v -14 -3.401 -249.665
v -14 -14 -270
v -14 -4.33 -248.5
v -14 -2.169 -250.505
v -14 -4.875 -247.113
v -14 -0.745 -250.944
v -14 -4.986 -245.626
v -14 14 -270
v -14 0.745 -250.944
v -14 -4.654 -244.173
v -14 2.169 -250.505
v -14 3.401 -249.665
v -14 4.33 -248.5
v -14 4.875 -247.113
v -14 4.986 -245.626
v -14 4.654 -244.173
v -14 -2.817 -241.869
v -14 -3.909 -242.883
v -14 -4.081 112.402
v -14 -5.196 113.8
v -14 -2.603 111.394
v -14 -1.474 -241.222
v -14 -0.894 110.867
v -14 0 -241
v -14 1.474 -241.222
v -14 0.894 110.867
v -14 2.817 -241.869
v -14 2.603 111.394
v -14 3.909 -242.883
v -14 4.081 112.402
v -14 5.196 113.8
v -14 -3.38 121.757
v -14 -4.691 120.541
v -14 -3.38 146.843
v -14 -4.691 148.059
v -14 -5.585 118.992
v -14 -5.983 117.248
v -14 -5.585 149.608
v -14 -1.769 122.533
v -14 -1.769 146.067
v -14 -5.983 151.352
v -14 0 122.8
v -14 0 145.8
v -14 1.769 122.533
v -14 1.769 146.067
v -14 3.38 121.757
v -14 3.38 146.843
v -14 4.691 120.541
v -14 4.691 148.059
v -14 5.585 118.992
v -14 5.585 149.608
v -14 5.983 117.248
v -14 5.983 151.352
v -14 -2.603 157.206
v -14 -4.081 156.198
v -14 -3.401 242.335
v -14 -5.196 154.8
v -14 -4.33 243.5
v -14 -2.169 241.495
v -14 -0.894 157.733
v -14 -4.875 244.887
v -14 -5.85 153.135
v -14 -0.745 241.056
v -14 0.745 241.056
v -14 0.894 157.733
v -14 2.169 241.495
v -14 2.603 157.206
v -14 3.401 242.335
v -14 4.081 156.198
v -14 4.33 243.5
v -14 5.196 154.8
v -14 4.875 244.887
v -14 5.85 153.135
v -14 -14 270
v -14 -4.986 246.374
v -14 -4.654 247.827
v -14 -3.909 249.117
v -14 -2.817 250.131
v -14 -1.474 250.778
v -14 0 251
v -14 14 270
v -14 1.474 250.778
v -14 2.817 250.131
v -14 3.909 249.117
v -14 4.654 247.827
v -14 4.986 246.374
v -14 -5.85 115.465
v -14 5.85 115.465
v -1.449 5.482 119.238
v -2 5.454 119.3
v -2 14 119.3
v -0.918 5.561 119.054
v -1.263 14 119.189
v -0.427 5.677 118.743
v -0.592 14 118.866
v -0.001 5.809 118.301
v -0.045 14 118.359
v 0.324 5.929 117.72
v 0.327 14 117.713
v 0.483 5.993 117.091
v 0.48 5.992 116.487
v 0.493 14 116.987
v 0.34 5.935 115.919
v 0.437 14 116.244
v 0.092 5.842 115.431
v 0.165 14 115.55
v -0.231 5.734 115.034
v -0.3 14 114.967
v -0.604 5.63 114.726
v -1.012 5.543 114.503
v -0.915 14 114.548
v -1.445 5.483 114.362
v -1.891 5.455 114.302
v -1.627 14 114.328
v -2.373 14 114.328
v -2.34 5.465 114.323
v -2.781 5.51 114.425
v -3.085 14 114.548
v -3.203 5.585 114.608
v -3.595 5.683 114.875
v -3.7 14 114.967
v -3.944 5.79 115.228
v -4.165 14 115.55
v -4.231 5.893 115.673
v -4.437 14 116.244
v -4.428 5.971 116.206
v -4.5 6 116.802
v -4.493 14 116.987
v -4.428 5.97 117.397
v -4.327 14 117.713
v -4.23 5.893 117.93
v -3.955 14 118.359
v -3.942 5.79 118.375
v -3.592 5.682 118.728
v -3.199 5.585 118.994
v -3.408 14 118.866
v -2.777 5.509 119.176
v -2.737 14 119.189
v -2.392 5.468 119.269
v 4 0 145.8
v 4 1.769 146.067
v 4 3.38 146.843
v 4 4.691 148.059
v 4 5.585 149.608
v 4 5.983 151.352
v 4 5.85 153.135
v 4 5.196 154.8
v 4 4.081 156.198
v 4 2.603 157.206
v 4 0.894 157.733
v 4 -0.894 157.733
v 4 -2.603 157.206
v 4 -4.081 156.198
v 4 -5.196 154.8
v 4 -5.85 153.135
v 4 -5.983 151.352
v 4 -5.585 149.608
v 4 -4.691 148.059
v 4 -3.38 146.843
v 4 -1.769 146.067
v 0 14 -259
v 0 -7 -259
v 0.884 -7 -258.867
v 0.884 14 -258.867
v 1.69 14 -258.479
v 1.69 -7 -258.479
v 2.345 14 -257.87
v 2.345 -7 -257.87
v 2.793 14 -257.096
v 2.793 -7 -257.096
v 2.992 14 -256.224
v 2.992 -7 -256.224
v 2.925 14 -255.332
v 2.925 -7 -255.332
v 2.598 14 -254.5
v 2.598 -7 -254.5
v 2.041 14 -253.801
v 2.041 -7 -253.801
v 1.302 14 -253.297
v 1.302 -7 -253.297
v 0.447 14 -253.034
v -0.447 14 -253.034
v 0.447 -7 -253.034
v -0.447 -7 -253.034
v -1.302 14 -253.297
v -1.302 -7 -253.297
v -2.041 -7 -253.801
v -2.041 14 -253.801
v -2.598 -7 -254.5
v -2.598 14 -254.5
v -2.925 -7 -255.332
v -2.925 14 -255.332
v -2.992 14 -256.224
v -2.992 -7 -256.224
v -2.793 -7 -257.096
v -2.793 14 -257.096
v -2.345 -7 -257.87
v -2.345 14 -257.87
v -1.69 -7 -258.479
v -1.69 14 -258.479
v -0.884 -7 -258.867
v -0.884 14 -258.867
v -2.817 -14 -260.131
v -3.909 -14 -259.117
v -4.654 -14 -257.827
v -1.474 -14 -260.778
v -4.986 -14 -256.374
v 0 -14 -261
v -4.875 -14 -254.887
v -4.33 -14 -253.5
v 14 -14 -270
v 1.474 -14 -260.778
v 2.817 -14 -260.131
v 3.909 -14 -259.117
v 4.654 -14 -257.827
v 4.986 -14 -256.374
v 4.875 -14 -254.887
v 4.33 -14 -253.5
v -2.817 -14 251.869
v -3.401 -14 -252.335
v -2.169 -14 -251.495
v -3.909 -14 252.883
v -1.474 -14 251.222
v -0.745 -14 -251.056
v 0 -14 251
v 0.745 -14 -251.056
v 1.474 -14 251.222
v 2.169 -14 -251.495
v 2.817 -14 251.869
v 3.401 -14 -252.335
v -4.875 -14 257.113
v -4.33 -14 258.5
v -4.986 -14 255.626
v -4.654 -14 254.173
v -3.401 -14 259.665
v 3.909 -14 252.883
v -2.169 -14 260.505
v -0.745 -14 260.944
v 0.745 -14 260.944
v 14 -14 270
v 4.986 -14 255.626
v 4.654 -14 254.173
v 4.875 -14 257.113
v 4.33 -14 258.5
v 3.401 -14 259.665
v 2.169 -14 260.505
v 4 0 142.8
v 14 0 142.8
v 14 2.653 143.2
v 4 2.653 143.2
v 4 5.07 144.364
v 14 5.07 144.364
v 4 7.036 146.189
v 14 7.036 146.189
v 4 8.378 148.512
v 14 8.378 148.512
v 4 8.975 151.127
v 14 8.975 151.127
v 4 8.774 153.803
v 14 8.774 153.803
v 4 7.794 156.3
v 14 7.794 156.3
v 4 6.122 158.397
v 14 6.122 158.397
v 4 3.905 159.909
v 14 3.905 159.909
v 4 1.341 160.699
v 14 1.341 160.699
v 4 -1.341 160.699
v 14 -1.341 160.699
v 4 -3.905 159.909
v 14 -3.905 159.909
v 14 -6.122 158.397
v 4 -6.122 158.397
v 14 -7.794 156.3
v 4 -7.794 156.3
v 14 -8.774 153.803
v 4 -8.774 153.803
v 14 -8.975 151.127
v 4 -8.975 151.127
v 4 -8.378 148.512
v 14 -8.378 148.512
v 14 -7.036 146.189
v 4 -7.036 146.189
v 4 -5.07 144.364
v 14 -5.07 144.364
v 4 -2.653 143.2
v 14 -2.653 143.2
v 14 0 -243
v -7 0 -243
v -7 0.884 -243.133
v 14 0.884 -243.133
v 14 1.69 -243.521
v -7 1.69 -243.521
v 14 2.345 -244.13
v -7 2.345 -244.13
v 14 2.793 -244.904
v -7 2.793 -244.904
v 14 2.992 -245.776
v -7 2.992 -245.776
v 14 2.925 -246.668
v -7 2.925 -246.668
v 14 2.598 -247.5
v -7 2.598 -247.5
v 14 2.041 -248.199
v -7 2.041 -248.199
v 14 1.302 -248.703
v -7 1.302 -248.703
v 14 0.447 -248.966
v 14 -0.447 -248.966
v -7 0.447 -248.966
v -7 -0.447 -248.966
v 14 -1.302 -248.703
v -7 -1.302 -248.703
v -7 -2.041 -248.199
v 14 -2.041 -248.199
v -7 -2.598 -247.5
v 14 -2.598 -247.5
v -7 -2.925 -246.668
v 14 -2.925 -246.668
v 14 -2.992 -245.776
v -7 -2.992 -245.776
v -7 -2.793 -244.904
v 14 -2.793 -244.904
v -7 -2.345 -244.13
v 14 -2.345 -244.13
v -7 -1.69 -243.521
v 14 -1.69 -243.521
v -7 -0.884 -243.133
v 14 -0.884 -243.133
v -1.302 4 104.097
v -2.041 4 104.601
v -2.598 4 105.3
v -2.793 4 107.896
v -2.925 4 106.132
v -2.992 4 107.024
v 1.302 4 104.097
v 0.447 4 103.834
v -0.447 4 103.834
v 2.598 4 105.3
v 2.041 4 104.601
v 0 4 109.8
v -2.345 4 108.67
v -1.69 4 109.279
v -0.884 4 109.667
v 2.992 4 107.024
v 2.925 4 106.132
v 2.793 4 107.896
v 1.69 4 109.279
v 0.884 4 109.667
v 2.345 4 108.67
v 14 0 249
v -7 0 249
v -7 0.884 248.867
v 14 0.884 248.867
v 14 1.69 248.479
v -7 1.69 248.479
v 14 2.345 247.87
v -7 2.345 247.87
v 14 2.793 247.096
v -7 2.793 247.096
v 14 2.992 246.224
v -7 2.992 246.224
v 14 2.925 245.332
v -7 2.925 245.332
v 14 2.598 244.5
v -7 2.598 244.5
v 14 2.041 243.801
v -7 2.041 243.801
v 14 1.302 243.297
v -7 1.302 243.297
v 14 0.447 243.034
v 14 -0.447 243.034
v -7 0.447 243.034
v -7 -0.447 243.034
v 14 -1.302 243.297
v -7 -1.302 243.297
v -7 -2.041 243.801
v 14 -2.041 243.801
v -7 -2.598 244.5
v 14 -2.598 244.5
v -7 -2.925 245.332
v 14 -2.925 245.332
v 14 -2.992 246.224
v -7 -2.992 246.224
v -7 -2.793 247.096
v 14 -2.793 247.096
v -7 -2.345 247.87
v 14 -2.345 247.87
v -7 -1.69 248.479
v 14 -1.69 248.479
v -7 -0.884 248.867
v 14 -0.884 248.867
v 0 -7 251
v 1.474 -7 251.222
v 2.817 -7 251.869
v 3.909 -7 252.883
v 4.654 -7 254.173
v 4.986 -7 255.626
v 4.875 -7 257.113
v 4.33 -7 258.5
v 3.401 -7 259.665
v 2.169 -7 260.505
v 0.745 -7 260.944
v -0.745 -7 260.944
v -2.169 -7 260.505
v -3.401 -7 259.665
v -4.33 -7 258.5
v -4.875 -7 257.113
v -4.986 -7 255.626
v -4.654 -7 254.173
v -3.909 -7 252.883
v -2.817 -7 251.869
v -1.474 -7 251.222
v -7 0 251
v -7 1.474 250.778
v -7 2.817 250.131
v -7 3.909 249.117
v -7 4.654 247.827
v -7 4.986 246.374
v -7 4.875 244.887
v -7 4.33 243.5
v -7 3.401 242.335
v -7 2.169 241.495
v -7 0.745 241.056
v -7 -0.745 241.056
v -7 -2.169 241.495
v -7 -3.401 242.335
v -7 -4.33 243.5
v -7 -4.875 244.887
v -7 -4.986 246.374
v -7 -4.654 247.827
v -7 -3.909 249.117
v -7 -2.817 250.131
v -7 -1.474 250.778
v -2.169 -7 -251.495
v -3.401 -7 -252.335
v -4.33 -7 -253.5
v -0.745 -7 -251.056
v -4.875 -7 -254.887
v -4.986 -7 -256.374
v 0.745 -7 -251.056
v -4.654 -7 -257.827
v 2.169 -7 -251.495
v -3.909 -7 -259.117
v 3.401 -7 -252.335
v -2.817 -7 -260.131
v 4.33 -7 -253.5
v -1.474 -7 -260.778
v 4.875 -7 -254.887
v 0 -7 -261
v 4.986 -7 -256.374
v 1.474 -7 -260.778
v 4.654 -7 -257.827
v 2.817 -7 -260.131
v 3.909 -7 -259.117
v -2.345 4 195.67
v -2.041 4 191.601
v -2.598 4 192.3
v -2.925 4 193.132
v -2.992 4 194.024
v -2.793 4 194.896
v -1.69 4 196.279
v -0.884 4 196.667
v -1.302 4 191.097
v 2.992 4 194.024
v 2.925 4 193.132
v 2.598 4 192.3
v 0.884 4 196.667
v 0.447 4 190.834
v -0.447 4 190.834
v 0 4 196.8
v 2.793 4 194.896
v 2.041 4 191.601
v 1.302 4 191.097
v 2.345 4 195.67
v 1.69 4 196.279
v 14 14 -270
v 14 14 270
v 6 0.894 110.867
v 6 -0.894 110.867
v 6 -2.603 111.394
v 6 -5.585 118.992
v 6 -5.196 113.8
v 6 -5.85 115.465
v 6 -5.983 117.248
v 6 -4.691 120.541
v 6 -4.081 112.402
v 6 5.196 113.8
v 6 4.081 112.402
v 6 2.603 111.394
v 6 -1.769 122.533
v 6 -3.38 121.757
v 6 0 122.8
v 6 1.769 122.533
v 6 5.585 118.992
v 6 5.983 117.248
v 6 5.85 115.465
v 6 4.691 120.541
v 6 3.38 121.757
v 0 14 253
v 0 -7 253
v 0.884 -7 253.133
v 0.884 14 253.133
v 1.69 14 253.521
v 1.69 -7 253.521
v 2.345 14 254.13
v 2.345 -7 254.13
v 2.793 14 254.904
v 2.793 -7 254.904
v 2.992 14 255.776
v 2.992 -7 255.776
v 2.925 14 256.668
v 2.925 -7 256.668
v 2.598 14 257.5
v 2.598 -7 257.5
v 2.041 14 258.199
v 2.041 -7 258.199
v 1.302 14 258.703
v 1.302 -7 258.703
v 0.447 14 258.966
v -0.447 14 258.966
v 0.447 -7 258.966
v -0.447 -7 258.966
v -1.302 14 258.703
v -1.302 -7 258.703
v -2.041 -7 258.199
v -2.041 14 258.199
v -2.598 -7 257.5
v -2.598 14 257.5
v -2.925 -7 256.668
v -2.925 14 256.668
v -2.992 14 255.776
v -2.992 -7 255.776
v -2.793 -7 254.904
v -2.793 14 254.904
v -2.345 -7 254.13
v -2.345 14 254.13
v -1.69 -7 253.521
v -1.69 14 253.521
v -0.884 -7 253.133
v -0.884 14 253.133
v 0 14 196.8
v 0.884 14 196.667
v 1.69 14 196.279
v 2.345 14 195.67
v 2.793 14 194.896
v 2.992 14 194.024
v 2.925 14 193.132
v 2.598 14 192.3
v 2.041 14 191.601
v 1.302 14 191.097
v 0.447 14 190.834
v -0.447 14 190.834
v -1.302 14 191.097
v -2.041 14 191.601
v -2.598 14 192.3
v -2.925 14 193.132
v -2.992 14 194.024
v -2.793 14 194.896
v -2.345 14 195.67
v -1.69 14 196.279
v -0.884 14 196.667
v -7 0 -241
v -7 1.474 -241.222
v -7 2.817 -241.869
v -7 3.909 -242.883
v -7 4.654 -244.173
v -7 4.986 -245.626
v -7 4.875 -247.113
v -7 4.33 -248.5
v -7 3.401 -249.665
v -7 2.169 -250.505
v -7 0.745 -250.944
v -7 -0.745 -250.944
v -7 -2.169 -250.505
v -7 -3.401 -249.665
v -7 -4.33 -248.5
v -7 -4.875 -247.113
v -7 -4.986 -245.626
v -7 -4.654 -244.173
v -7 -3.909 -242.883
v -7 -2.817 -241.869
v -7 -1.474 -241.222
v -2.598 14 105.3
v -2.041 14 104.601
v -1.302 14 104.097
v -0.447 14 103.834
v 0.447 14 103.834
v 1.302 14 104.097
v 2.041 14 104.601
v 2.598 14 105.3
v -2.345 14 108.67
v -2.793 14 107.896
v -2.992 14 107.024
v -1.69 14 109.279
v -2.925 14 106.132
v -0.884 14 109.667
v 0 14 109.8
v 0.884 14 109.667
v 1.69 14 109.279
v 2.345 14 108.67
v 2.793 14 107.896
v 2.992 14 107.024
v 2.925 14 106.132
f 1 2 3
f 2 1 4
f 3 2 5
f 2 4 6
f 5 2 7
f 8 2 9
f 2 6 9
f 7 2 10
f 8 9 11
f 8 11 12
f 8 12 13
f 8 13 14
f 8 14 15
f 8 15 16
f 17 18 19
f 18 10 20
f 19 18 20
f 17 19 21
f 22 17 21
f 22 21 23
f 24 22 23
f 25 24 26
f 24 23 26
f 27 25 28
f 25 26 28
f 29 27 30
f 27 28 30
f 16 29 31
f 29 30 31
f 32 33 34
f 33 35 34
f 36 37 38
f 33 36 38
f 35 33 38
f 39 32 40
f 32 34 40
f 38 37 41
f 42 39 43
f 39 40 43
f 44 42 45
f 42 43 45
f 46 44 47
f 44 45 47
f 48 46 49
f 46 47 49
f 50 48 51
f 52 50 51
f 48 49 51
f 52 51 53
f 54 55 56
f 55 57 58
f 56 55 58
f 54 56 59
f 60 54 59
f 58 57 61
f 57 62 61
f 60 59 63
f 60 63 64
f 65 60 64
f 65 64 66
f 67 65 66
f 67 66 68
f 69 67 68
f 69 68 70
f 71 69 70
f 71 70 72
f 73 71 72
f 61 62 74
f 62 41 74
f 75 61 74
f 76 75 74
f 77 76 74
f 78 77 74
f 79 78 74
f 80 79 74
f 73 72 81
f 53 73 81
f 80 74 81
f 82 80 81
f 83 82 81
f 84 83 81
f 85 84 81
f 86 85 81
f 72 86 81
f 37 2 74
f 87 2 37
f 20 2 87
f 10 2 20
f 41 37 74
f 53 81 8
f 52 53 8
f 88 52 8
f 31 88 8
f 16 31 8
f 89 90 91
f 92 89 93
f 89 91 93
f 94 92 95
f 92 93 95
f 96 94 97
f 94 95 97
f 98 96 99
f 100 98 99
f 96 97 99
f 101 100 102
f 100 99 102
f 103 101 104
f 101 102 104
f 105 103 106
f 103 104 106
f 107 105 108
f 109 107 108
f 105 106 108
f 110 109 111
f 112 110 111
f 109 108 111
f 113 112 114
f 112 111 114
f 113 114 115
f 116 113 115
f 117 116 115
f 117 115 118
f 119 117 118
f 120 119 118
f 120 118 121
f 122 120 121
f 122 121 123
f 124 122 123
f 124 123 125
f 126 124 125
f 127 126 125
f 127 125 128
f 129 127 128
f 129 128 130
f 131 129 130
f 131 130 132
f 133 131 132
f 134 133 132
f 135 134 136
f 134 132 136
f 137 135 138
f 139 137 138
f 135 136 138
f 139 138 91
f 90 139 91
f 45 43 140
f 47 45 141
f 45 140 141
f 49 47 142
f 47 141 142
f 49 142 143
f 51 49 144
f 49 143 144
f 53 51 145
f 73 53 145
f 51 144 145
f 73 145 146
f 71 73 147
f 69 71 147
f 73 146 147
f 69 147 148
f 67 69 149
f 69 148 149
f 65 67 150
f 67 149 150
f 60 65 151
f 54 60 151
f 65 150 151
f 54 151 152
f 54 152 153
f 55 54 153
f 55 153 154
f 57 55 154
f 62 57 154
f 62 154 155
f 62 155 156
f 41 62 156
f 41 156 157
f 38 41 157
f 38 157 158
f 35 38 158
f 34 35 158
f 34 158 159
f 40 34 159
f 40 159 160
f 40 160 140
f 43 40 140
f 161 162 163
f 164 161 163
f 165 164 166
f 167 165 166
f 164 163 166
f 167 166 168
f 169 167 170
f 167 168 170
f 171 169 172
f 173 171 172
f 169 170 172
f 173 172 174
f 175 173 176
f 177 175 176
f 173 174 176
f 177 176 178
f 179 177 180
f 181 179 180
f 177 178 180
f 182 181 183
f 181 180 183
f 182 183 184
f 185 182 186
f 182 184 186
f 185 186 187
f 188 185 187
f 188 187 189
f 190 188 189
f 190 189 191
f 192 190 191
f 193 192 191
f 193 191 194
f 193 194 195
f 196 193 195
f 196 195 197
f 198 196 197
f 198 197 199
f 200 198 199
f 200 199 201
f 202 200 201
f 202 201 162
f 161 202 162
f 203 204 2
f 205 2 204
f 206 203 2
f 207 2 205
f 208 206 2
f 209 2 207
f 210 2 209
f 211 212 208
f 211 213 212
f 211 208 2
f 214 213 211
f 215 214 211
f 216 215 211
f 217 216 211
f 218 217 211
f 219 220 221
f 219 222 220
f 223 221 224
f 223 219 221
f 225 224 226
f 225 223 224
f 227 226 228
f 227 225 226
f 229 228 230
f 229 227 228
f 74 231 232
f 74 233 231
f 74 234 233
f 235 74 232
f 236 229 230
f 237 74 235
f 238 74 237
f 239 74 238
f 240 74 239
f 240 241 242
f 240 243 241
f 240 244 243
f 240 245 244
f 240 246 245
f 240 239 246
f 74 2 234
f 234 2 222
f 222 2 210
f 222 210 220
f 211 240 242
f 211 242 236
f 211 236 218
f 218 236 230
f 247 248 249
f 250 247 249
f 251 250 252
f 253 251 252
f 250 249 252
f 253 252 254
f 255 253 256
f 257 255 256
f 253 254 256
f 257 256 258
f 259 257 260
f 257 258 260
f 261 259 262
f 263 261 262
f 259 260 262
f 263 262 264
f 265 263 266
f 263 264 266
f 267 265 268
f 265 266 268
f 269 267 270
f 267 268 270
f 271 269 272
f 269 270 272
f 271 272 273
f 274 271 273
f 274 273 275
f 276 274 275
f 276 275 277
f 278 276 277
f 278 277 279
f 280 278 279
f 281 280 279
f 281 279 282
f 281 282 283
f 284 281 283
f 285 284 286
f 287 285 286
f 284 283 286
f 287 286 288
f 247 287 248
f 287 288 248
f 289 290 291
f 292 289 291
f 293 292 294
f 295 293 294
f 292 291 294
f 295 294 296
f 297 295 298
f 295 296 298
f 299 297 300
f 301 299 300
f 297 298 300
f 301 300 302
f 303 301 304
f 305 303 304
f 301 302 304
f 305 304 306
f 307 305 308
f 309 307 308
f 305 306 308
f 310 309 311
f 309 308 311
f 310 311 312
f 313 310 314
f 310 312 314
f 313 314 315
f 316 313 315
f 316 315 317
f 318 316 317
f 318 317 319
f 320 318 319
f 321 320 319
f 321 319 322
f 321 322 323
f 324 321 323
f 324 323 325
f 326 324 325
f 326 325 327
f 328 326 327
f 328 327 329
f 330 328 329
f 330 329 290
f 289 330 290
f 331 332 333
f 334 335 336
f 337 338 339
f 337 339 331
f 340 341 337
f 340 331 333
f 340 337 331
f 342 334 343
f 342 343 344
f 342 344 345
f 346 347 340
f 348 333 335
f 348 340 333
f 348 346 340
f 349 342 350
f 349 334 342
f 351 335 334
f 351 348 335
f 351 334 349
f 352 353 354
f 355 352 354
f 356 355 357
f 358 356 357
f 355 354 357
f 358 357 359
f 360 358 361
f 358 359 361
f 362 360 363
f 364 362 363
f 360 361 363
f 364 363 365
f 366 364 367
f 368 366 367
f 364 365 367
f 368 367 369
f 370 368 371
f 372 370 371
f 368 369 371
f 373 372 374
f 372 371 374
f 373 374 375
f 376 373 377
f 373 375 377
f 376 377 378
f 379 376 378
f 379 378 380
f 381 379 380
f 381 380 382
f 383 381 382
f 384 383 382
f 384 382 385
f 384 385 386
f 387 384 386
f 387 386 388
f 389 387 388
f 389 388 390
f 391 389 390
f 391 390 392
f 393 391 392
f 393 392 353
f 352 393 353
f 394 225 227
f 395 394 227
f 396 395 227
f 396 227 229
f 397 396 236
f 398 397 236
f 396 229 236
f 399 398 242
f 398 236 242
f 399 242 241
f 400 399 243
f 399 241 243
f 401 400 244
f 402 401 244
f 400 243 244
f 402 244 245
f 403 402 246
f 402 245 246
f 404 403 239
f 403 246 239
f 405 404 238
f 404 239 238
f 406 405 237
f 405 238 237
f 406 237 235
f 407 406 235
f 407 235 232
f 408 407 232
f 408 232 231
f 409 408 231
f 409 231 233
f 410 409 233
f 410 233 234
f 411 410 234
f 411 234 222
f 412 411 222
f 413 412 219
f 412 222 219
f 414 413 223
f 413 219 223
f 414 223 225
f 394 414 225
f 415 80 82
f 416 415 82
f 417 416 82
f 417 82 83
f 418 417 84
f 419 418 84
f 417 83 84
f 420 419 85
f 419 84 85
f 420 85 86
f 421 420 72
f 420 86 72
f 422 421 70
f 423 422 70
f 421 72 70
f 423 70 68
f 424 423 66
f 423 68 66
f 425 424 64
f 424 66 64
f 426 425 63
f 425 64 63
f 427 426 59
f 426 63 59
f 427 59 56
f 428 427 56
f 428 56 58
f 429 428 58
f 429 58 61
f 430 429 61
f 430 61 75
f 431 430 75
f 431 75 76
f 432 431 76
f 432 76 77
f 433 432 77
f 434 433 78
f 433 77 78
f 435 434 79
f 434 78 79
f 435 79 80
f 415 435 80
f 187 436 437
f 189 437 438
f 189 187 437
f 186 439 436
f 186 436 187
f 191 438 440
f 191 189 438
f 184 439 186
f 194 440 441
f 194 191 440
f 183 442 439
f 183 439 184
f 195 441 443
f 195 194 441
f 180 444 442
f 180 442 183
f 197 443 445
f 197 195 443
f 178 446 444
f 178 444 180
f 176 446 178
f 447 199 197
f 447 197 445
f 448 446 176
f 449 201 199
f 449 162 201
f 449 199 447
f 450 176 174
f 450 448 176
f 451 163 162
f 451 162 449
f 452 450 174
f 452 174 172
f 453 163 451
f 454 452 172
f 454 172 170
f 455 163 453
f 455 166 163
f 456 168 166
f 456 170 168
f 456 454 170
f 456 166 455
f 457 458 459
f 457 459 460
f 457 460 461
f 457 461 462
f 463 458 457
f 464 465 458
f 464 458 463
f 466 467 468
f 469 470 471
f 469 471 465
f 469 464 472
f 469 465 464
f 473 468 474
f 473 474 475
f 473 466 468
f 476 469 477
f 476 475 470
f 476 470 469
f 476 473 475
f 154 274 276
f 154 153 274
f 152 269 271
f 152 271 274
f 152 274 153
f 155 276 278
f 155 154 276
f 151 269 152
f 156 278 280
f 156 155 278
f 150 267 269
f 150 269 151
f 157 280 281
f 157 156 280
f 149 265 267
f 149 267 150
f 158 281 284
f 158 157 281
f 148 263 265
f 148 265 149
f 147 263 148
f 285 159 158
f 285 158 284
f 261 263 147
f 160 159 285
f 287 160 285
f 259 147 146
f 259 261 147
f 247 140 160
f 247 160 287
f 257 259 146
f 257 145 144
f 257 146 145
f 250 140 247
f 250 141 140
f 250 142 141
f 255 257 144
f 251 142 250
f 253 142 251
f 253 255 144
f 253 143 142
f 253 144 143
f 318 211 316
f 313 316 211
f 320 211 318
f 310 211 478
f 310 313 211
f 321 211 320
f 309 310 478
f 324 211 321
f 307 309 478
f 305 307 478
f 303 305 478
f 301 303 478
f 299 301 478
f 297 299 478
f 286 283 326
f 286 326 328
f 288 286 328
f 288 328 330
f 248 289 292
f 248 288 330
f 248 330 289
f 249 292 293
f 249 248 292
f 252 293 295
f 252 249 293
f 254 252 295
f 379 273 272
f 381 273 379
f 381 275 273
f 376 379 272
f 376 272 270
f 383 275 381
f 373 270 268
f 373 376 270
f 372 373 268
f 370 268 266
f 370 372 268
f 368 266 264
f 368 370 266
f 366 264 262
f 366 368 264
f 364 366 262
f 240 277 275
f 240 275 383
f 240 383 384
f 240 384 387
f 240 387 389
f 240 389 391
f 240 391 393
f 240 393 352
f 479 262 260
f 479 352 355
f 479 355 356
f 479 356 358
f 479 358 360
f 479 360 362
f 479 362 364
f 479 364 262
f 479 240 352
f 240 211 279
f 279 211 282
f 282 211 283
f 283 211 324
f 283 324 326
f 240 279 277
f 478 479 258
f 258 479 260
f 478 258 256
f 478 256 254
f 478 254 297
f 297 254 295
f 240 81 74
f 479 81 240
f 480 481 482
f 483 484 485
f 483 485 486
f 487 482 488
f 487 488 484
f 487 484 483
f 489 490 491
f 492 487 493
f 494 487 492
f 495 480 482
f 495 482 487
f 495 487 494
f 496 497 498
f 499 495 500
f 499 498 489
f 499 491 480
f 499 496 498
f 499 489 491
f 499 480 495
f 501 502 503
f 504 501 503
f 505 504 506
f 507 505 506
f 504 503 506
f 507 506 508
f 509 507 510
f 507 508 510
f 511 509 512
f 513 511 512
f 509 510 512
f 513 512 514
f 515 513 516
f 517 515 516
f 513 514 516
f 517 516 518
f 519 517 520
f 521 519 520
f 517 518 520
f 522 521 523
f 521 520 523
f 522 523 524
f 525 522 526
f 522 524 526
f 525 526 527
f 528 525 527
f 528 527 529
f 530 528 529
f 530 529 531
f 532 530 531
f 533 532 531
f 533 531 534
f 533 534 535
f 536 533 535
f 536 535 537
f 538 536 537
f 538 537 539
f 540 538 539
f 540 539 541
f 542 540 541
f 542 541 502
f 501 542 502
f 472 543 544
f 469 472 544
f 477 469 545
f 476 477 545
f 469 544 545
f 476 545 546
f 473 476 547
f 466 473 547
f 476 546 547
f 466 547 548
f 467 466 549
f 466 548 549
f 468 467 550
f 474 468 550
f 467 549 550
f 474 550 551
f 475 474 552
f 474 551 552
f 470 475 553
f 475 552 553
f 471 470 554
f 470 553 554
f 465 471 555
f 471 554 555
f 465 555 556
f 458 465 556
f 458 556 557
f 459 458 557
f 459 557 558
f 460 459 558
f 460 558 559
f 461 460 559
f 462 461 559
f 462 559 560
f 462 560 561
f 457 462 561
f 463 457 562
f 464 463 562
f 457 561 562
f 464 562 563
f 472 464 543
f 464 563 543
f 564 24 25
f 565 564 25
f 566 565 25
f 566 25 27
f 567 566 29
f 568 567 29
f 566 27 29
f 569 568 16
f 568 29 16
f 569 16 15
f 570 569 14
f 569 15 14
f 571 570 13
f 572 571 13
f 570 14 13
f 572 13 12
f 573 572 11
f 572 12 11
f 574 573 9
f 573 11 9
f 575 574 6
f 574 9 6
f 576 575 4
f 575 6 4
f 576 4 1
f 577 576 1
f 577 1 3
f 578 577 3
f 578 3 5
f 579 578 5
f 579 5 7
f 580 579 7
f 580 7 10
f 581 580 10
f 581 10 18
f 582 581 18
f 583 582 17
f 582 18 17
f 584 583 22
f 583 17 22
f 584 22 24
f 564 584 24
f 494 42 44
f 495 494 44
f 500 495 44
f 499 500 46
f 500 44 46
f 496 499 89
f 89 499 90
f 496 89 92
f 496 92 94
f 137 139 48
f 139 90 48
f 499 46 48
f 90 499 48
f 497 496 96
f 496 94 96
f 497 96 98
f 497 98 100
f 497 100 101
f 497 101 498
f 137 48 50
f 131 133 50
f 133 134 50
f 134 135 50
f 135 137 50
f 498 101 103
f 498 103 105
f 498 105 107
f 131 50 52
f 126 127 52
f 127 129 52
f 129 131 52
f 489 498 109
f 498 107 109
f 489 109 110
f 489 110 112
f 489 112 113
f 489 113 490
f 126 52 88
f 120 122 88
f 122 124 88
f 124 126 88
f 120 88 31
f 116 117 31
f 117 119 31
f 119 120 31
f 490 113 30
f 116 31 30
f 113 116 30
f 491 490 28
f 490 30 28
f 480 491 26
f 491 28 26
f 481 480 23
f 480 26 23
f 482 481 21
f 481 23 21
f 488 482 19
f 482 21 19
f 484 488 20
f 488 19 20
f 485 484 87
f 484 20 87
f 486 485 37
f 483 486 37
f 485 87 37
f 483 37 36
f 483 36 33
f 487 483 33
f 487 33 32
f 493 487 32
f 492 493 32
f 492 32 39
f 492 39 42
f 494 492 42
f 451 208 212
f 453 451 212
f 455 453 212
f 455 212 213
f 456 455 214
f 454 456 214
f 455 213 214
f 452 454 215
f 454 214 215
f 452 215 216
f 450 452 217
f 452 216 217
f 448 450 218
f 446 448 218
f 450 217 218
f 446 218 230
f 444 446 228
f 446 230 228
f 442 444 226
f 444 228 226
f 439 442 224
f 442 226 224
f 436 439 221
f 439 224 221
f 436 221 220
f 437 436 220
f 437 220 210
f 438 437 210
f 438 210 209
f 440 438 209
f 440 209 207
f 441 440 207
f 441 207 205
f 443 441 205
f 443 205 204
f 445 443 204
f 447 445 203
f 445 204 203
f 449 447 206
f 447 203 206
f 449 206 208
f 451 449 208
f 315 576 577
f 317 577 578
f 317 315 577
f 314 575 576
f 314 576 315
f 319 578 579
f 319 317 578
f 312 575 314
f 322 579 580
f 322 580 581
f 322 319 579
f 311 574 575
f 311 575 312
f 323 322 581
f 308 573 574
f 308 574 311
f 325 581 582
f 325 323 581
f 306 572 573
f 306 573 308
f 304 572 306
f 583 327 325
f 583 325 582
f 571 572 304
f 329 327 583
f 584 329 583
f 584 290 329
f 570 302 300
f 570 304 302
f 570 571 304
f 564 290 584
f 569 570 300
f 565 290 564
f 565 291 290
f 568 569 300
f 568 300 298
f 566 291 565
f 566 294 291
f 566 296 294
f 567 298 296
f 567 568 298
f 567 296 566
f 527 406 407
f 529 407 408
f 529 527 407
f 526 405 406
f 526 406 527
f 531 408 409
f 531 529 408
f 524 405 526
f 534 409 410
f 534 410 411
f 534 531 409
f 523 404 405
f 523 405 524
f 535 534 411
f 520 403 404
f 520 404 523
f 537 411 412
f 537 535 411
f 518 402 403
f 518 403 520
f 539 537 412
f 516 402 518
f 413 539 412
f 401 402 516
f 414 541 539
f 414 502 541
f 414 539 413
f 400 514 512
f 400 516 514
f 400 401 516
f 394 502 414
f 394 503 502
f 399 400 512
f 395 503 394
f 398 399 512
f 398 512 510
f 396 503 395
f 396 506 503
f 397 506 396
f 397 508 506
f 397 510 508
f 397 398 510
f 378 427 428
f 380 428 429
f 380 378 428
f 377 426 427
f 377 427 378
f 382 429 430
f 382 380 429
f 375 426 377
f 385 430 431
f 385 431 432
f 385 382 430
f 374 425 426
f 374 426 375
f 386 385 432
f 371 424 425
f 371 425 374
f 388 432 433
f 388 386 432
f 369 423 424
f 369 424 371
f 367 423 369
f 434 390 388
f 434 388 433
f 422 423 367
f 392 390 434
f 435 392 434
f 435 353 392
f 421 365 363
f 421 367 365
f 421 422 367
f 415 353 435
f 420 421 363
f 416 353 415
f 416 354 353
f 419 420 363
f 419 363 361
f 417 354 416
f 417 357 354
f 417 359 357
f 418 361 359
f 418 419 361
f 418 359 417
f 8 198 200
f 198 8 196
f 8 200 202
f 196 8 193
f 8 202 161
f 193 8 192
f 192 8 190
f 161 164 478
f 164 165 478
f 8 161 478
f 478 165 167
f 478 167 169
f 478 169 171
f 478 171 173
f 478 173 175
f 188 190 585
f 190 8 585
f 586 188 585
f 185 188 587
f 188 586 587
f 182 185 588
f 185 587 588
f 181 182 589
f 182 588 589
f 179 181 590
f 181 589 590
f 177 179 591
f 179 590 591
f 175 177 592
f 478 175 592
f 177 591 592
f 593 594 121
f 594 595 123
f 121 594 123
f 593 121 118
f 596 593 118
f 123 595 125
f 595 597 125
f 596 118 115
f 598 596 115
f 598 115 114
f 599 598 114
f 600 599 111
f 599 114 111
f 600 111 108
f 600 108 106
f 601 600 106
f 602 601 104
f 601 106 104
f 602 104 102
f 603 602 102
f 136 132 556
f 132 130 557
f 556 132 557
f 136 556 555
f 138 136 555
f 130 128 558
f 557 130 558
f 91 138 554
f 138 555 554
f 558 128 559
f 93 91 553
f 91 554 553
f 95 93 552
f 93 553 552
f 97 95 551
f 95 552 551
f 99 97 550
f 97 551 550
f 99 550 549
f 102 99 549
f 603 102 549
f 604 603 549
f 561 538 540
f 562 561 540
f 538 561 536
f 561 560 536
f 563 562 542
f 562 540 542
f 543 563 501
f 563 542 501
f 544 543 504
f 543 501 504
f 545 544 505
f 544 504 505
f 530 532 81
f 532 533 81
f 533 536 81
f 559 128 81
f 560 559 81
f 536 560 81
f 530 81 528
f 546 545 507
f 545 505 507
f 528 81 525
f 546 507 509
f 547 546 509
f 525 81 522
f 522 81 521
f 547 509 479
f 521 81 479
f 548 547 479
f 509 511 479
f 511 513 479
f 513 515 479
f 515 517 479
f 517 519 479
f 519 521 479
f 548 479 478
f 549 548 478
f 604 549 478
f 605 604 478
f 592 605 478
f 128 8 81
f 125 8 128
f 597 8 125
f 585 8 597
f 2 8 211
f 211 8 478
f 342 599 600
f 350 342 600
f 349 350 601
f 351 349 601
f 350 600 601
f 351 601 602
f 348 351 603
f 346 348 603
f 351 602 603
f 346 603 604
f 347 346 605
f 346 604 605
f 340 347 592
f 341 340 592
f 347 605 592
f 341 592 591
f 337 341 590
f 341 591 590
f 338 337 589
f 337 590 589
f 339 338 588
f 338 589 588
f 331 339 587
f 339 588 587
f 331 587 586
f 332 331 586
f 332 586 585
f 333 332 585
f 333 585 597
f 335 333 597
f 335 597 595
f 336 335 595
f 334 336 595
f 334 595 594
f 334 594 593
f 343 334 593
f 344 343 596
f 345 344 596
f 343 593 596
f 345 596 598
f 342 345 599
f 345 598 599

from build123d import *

# Parameters (mm, degrees)
IZIM1_W                     = 28
IZIM1_H                     = 28
Y_KSEKLIK_EKSTR_ZYON1_DEPTH = 270
IZIM3_R                     = 3
KES_EKSTR_ZYON2_DEPTH       = 272.808756298
IZIM4_R                     = 5
KES_EKSTR_ZYON3_DEPTH       = 7
IZIM5_R                     = 6
KES_EKSTR_ZYON4_DEPTH       = 272.808756298
IZIM6_R                     = 9
KES_EKSTR_ZYON5_DEPTH       = 10
IZIM7_R                     = 3
KES_EKSTR_ZYON6_DEPTH       = 272.808756298
IZIM8_R                     = 5
KES_EKSTR_ZYON7_DEPTH       = 7
SKETCH1_R                   = 3
CUT_EXTRUDE1_DEPTH          = 10
SKETCH2_R                   = 6
CUT_EXTRUDE2_DEPTH          = 20
SKETCH3_R                   = 2.5
CUT_EXTRUDE3_DEPTH          = 14


with BuildPart() as part:
    # Çizim1 → Yükseklik-Ekstrüzyon1 (new, symmetric)
    with BuildSketch(Plane.XY):
        Rectangle(IZIM1_W, IZIM1_H)
    extrude(amount=Y_KSEKLIK_EKSTR_ZYON1_DEPTH, both=True)

    # Çizim3 → Kes-Ekstrüzyon2 (cut, through all)
    with BuildSketch(Plane.XZ.offset(14)):
        with Locations(Location((0, -256, 0), (0, 0, 270))):
            Circle(IZIM3_R)
        with Locations(Location((0, 256, 0), (0, 0, 270))):
            Circle(IZIM3_R)
    extrude(amount=-KES_EKSTR_ZYON2_DEPTH, mode=Mode.SUBTRACT)

    # Çizim4 → Kes-Ekstrüzyon3 (cut)
    with BuildSketch(Plane.XZ.offset(14)):
        with Locations(Location((0, -256, 0), (0, 0, 270))):
            Circle(IZIM4_R)
        with Locations(Location((0, 256, 0), (0, 0, 270))):
            Circle(IZIM4_R)
    extrude(amount=-KES_EKSTR_ZYON3_DEPTH, mode=Mode.SUBTRACT)

    # Çizim5 → Kes-Ekstrüzyon4 (cut, through all)
    with BuildSketch(Plane(origin=(14, 0, 0), x_dir=(0, 0, -1), z_dir=(1, 0, 0))):
        with Locations((-151.8, 0)):
            Circle(IZIM5_R)
    extrude(amount=-KES_EKSTR_ZYON4_DEPTH, mode=Mode.SUBTRACT)

    # Çizim6 → Kes-Ekstrüzyon5 (cut)
    with BuildSketch(Plane(origin=(14, 0, 0), x_dir=(0, 0, -1), z_dir=(1, 0, 0))):
        with Locations((-151.8, 0)):
            Circle(IZIM6_R)
    extrude(amount=-KES_EKSTR_ZYON5_DEPTH, mode=Mode.SUBTRACT)

    # Çizim7 → Kes-Ekstrüzyon6 (cut, through all)
    with BuildSketch(Plane.ZY.offset(14)):
        with Locations((-246, 0)):
            Circle(IZIM7_R)
        with Locations((246, 0)):
            Circle(IZIM7_R)
    extrude(amount=-KES_EKSTR_ZYON6_DEPTH, mode=Mode.SUBTRACT)

    # Çizim8 → Kes-Ekstrüzyon7 (cut)
    with BuildSketch(Plane.ZY.offset(14)):
        with Locations((-246, 0)):
            Circle(IZIM8_R)
        with Locations((246, 0)):
            Circle(IZIM8_R)
    extrude(amount=-KES_EKSTR_ZYON7_DEPTH, mode=Mode.SUBTRACT)

    # Sketch1 → Cut-Extrude1 (cut)
    with BuildSketch(Plane(origin=(0, 14, 0), x_dir=(1, 0, 0), z_dir=(0, 1, 0))):
        with Locations(Location((0, -106.8, 0), (0, 0, 270))):
            Circle(SKETCH1_R)
        with Locations(Location((0, -193.8, 0), (0, 0, 270))):
            Circle(SKETCH1_R)
    extrude(amount=-CUT_EXTRUDE1_DEPTH, mode=Mode.SUBTRACT)

    # Sketch2 → Cut-Extrude2 (cut)
    with BuildSketch(Plane.ZY.offset(14)):
        with Locations((116.8, 0)):
            Circle(SKETCH2_R)
    extrude(amount=-CUT_EXTRUDE2_DEPTH, mode=Mode.SUBTRACT)

    # Sketch3 → Cut-Extrude3 (cut)
    with BuildSketch(Plane(origin=(0, 14, 0), x_dir=(1, 0, 0), z_dir=(0, 1, 0))):
        with Locations(Location((-2, -116.8, 0), (0, 0, 270))):
            Circle(SKETCH3_R)
    extrude(amount=-CUT_EXTRUDE3_DEPTH, mode=Mode.SUBTRACT)


solid = part.part
